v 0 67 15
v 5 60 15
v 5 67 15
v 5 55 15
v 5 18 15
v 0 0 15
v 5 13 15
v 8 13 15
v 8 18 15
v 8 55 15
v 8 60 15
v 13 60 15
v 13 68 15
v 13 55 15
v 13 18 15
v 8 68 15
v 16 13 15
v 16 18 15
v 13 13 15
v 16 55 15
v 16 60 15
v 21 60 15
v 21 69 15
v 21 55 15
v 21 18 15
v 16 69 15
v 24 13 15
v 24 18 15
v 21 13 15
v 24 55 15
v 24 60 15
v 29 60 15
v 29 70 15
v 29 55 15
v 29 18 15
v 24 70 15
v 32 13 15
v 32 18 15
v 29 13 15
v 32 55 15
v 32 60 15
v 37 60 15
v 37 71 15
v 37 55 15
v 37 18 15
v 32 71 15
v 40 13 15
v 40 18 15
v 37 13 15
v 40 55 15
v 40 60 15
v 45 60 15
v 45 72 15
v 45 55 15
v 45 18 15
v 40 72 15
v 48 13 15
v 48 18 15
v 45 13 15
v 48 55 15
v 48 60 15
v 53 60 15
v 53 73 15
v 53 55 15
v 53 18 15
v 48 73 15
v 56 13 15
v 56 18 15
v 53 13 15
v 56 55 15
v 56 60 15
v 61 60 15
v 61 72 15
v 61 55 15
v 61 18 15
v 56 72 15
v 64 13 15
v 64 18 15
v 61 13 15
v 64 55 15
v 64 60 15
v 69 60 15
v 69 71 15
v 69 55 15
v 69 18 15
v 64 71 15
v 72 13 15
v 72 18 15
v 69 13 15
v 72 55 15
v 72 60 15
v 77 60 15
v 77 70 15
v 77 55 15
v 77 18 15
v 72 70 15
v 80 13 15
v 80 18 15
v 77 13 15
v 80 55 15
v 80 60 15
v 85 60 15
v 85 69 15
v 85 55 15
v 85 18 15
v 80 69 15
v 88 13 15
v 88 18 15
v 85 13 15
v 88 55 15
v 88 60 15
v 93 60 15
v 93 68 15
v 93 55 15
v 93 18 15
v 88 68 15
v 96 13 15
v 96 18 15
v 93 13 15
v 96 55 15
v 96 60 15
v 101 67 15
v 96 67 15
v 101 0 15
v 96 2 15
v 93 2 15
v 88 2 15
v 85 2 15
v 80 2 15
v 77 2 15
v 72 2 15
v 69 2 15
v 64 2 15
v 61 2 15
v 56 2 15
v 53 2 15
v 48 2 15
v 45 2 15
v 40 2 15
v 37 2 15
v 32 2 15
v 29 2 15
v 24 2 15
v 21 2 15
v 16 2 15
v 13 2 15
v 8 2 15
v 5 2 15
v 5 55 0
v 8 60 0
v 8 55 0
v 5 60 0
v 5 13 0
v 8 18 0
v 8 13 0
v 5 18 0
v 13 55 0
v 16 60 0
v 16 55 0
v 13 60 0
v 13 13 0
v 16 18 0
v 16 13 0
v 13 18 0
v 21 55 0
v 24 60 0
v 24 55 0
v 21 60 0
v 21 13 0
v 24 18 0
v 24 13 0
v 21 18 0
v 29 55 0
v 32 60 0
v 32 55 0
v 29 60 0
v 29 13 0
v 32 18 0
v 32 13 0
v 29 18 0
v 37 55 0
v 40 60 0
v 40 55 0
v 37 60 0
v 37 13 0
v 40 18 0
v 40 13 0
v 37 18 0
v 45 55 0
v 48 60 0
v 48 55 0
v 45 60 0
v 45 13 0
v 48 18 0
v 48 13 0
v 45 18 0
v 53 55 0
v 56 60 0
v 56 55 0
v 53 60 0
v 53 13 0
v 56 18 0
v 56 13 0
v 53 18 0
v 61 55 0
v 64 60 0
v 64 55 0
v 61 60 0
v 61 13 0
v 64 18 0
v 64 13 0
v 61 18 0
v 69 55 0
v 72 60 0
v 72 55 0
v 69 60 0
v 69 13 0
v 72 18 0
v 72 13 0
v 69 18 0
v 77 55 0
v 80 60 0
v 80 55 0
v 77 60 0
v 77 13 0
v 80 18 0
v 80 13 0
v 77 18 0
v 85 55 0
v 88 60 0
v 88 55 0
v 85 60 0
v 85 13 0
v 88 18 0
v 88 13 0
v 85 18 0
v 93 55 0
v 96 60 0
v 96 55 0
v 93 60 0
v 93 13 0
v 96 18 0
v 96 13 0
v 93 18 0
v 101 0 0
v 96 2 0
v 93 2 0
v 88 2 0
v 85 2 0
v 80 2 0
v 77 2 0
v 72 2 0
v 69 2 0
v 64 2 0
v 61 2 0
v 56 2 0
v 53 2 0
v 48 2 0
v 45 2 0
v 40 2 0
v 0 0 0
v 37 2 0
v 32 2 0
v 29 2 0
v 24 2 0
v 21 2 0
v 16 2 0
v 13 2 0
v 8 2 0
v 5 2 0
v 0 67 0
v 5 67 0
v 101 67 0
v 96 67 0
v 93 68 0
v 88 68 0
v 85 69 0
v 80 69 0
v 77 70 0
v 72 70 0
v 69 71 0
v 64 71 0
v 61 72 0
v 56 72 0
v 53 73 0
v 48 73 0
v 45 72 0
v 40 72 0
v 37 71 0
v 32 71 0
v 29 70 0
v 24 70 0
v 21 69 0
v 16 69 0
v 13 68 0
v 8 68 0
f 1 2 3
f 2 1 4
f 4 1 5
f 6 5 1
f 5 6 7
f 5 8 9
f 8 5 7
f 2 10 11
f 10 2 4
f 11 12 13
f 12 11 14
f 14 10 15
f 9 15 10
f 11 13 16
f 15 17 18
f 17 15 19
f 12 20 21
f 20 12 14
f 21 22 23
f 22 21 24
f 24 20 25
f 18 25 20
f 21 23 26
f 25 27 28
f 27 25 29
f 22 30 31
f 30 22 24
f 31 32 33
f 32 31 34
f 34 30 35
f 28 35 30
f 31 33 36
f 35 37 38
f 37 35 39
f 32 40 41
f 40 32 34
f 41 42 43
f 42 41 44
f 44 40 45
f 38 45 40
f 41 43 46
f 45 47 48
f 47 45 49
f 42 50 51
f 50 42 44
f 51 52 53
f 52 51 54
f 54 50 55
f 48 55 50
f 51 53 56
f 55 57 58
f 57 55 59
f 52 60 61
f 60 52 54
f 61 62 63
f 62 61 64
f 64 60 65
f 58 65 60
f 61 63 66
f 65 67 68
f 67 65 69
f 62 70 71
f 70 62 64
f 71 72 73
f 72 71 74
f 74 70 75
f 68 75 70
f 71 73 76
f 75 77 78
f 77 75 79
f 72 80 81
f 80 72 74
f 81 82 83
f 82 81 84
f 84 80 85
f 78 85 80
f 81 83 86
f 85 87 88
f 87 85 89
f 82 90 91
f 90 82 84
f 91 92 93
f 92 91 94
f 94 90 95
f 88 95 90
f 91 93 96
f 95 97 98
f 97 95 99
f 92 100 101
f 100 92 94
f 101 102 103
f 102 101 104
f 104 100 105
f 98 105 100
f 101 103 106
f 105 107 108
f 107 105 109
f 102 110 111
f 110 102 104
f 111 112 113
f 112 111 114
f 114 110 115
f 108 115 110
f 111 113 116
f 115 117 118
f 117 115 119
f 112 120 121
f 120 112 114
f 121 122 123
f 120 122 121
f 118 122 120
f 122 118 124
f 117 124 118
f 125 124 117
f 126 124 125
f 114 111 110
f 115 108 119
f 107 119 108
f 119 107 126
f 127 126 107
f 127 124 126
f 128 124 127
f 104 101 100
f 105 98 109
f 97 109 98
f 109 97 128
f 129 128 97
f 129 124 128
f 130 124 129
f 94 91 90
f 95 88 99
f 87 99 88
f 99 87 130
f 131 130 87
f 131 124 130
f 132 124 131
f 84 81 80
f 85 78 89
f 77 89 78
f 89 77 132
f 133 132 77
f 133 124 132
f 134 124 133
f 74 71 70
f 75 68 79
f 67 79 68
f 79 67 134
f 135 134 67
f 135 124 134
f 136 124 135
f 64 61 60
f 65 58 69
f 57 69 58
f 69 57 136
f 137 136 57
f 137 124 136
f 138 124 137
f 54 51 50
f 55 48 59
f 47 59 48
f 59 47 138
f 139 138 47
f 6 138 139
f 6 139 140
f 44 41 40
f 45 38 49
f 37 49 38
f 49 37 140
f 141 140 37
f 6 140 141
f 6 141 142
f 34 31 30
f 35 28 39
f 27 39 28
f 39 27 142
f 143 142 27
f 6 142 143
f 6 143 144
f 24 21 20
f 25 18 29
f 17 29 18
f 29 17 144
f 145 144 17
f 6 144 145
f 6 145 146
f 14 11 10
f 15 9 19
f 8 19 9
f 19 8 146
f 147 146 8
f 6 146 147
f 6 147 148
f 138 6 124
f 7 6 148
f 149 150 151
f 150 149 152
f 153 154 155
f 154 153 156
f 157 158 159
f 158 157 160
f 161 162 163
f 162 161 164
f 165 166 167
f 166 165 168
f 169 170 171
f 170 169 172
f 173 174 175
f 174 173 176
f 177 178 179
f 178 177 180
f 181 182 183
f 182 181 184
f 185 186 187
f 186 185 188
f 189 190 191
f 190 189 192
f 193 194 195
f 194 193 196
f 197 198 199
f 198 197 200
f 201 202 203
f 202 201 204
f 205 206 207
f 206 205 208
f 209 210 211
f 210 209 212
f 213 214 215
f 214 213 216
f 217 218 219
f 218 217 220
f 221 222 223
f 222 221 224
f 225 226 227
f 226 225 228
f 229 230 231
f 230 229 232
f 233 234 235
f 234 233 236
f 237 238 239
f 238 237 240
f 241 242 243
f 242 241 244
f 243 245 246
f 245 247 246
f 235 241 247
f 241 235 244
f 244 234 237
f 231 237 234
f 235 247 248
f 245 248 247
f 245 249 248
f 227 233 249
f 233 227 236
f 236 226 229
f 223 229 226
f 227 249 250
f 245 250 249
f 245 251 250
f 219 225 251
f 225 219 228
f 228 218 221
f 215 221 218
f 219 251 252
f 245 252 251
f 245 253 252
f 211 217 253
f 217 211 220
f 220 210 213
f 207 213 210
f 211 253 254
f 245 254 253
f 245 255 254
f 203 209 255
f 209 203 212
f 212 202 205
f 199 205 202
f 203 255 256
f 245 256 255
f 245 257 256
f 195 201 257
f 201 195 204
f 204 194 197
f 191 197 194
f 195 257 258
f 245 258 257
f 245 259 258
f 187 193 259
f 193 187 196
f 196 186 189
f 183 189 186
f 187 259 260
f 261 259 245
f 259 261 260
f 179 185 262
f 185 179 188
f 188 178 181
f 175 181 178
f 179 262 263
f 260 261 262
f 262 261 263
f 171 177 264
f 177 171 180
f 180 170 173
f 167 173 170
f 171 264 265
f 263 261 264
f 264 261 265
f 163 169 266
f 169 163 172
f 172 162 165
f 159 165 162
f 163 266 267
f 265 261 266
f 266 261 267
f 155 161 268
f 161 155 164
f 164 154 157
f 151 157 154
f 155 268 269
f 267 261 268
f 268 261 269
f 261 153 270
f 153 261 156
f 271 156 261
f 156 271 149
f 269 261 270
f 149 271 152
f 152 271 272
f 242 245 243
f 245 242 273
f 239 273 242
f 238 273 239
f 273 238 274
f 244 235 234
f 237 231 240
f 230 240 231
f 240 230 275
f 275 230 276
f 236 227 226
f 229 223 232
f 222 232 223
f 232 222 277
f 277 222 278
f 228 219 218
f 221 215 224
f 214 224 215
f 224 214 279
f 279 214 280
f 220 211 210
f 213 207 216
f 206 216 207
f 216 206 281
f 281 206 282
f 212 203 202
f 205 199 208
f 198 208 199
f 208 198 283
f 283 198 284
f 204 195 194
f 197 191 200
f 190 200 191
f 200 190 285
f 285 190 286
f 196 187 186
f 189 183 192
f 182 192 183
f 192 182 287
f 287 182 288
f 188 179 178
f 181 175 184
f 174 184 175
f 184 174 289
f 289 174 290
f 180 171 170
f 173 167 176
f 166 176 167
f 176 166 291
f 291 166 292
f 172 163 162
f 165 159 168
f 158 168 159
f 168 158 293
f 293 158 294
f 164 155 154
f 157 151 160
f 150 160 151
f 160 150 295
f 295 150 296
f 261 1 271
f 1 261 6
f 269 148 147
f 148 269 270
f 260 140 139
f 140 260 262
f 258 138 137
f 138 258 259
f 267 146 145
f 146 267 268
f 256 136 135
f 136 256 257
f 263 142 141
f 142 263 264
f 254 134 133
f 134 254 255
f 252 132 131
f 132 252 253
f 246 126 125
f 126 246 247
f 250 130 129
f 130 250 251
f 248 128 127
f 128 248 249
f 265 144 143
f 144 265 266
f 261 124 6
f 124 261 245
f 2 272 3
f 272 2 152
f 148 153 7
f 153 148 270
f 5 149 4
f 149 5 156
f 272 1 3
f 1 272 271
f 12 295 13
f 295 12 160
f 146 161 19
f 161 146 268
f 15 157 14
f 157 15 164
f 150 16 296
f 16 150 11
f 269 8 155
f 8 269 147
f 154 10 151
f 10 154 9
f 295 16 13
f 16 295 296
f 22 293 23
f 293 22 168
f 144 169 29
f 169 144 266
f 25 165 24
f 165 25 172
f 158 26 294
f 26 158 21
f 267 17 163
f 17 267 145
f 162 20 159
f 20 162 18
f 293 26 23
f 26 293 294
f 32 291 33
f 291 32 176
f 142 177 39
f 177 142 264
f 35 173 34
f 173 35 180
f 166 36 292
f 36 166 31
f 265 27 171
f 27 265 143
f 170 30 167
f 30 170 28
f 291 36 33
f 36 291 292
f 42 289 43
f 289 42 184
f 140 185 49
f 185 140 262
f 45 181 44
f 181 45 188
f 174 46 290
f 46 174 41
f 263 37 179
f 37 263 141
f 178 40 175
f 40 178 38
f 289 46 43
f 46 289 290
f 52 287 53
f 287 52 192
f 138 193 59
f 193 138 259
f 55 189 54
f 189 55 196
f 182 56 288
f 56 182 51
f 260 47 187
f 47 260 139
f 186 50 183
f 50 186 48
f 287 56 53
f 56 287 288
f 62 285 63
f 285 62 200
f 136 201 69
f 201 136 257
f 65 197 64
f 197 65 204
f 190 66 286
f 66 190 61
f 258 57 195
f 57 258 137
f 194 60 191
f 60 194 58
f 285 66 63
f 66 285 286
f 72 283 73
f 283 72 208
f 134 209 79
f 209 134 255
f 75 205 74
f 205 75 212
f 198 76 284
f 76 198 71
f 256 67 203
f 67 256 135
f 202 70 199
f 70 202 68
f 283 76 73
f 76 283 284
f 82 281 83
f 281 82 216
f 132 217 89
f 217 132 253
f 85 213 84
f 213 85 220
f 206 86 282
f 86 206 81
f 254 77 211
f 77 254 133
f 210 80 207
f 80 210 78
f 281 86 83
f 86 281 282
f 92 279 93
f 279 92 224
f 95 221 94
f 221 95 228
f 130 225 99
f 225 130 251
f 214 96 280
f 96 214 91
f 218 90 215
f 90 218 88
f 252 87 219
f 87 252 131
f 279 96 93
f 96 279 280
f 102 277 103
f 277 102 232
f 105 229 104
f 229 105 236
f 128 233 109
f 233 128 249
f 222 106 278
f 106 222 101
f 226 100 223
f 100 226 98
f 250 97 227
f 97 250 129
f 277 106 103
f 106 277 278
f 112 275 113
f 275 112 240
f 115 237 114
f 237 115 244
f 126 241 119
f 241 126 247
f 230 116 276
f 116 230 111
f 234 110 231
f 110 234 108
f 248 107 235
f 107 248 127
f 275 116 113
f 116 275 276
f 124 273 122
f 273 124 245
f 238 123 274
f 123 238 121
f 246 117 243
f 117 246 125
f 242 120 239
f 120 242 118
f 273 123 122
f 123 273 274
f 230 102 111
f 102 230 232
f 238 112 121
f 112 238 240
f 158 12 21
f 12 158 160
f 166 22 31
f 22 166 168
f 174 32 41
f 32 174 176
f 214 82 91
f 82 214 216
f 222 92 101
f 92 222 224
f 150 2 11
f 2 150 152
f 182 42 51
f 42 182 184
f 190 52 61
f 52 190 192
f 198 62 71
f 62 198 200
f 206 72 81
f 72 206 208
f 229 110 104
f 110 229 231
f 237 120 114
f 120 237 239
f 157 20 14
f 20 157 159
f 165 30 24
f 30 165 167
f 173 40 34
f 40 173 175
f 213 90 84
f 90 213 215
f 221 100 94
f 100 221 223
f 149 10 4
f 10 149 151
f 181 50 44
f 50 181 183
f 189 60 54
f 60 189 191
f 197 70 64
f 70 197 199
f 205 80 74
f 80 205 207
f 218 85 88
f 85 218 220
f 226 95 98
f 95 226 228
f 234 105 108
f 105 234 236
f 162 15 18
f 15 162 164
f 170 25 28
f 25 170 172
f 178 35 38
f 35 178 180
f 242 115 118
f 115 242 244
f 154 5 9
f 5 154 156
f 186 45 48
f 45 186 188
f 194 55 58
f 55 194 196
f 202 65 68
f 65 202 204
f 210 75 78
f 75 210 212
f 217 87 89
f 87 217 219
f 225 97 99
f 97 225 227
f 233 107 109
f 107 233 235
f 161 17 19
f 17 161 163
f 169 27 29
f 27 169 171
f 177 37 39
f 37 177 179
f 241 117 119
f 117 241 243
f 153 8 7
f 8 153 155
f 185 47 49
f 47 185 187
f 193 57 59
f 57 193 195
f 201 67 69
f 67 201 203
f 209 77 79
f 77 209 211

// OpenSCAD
// Забор by @Karimov_Sheroz

cube([100, 2, 15]); color([0.56,0.23,0])  // параллелепипед со сторонами 100,2,15  мм
cube([100, 2, 15]); color([0.56,0.23,0])  // параллелепипед со сторонами 100,2,15  мм  
  translate([0,0,0]) cube([5, 67, 15]); color([0.56,0.23,0])  // параллелепипед со сторонами 5, 67, 15  мм
translate([8,0,0]) cube([5, 68, 15]); color([0.56,0.23,0])  //параллелепипед со сторонами 5, 68, 15  мм
translate([16,0,0]) cube([5, 69, 15]); color([0.56,0.23,0])  // параллелепипед со сторонами 5, 69, 15  мм 
translate([24,0,0]) cube([5, 70, 15]); color([0.56,0.23,0])  // параллелепипед со сторонами 5, 70, 15  мм  
translate([32,0,0]) cube([5, 71, 15]); color([0.56,0.23,0])   //параллелепипед со сторонами 5, 71, 15  мм
  translate([40,0,0]) cube([5, 72, 15]); color([0.56,0.23,0])  //параллелепипед со сторонами 5, 72, 15  мм
translate([48,0,0]) cube([5, 73, 15]); color([0.56,0.23,0])  //параллелепипед со сторонами 5, 73, 15  мм
 translate([56,0,0]) cube([5, 72, 15]); color([0.56,0.23,0])  //параллелепипед со сторонами 5, 72, 15  мм
 translate([64,0,0]) cube([5, 71, 15]); color([0.56,0.23,0])  //параллелепипед со сторонами 5, 71, 15  мм
translate([72,0,0]) cube([5, 70, 15]); color([0.56,0.23,0])  //параллелепипед со сторонами 5, 70, 15  мм 
translate([80,0,0]) cube([5, 69, 15]); color([0.56,0.23,0])  //параллелепипед со сторонами 5, 69, 15  мм
translate([88,0,0]) cube([5, 68, 15]); color([0.56,0.23,0])  //параллелепипед со сторонами 5, 68, 15  мм
translate([96,0,0]) cube([5, 67, 15]);  // параллелепипед со сторонами 5, 67, 15 мм 
cube([100, 2, 15]);  //параллелепипед со сторонами 100,2,15  мм
translate([0,55,0]) cube([100, 5, 15]); color([0.56,0.23,0]) //параллелепипед со сторонами 100,5,15  мм
cube([100, 2, 15]);
translate([0,13,0]) cube([100, 5, 15]); //параллелепипед со сторонами 100,5,15  мм
